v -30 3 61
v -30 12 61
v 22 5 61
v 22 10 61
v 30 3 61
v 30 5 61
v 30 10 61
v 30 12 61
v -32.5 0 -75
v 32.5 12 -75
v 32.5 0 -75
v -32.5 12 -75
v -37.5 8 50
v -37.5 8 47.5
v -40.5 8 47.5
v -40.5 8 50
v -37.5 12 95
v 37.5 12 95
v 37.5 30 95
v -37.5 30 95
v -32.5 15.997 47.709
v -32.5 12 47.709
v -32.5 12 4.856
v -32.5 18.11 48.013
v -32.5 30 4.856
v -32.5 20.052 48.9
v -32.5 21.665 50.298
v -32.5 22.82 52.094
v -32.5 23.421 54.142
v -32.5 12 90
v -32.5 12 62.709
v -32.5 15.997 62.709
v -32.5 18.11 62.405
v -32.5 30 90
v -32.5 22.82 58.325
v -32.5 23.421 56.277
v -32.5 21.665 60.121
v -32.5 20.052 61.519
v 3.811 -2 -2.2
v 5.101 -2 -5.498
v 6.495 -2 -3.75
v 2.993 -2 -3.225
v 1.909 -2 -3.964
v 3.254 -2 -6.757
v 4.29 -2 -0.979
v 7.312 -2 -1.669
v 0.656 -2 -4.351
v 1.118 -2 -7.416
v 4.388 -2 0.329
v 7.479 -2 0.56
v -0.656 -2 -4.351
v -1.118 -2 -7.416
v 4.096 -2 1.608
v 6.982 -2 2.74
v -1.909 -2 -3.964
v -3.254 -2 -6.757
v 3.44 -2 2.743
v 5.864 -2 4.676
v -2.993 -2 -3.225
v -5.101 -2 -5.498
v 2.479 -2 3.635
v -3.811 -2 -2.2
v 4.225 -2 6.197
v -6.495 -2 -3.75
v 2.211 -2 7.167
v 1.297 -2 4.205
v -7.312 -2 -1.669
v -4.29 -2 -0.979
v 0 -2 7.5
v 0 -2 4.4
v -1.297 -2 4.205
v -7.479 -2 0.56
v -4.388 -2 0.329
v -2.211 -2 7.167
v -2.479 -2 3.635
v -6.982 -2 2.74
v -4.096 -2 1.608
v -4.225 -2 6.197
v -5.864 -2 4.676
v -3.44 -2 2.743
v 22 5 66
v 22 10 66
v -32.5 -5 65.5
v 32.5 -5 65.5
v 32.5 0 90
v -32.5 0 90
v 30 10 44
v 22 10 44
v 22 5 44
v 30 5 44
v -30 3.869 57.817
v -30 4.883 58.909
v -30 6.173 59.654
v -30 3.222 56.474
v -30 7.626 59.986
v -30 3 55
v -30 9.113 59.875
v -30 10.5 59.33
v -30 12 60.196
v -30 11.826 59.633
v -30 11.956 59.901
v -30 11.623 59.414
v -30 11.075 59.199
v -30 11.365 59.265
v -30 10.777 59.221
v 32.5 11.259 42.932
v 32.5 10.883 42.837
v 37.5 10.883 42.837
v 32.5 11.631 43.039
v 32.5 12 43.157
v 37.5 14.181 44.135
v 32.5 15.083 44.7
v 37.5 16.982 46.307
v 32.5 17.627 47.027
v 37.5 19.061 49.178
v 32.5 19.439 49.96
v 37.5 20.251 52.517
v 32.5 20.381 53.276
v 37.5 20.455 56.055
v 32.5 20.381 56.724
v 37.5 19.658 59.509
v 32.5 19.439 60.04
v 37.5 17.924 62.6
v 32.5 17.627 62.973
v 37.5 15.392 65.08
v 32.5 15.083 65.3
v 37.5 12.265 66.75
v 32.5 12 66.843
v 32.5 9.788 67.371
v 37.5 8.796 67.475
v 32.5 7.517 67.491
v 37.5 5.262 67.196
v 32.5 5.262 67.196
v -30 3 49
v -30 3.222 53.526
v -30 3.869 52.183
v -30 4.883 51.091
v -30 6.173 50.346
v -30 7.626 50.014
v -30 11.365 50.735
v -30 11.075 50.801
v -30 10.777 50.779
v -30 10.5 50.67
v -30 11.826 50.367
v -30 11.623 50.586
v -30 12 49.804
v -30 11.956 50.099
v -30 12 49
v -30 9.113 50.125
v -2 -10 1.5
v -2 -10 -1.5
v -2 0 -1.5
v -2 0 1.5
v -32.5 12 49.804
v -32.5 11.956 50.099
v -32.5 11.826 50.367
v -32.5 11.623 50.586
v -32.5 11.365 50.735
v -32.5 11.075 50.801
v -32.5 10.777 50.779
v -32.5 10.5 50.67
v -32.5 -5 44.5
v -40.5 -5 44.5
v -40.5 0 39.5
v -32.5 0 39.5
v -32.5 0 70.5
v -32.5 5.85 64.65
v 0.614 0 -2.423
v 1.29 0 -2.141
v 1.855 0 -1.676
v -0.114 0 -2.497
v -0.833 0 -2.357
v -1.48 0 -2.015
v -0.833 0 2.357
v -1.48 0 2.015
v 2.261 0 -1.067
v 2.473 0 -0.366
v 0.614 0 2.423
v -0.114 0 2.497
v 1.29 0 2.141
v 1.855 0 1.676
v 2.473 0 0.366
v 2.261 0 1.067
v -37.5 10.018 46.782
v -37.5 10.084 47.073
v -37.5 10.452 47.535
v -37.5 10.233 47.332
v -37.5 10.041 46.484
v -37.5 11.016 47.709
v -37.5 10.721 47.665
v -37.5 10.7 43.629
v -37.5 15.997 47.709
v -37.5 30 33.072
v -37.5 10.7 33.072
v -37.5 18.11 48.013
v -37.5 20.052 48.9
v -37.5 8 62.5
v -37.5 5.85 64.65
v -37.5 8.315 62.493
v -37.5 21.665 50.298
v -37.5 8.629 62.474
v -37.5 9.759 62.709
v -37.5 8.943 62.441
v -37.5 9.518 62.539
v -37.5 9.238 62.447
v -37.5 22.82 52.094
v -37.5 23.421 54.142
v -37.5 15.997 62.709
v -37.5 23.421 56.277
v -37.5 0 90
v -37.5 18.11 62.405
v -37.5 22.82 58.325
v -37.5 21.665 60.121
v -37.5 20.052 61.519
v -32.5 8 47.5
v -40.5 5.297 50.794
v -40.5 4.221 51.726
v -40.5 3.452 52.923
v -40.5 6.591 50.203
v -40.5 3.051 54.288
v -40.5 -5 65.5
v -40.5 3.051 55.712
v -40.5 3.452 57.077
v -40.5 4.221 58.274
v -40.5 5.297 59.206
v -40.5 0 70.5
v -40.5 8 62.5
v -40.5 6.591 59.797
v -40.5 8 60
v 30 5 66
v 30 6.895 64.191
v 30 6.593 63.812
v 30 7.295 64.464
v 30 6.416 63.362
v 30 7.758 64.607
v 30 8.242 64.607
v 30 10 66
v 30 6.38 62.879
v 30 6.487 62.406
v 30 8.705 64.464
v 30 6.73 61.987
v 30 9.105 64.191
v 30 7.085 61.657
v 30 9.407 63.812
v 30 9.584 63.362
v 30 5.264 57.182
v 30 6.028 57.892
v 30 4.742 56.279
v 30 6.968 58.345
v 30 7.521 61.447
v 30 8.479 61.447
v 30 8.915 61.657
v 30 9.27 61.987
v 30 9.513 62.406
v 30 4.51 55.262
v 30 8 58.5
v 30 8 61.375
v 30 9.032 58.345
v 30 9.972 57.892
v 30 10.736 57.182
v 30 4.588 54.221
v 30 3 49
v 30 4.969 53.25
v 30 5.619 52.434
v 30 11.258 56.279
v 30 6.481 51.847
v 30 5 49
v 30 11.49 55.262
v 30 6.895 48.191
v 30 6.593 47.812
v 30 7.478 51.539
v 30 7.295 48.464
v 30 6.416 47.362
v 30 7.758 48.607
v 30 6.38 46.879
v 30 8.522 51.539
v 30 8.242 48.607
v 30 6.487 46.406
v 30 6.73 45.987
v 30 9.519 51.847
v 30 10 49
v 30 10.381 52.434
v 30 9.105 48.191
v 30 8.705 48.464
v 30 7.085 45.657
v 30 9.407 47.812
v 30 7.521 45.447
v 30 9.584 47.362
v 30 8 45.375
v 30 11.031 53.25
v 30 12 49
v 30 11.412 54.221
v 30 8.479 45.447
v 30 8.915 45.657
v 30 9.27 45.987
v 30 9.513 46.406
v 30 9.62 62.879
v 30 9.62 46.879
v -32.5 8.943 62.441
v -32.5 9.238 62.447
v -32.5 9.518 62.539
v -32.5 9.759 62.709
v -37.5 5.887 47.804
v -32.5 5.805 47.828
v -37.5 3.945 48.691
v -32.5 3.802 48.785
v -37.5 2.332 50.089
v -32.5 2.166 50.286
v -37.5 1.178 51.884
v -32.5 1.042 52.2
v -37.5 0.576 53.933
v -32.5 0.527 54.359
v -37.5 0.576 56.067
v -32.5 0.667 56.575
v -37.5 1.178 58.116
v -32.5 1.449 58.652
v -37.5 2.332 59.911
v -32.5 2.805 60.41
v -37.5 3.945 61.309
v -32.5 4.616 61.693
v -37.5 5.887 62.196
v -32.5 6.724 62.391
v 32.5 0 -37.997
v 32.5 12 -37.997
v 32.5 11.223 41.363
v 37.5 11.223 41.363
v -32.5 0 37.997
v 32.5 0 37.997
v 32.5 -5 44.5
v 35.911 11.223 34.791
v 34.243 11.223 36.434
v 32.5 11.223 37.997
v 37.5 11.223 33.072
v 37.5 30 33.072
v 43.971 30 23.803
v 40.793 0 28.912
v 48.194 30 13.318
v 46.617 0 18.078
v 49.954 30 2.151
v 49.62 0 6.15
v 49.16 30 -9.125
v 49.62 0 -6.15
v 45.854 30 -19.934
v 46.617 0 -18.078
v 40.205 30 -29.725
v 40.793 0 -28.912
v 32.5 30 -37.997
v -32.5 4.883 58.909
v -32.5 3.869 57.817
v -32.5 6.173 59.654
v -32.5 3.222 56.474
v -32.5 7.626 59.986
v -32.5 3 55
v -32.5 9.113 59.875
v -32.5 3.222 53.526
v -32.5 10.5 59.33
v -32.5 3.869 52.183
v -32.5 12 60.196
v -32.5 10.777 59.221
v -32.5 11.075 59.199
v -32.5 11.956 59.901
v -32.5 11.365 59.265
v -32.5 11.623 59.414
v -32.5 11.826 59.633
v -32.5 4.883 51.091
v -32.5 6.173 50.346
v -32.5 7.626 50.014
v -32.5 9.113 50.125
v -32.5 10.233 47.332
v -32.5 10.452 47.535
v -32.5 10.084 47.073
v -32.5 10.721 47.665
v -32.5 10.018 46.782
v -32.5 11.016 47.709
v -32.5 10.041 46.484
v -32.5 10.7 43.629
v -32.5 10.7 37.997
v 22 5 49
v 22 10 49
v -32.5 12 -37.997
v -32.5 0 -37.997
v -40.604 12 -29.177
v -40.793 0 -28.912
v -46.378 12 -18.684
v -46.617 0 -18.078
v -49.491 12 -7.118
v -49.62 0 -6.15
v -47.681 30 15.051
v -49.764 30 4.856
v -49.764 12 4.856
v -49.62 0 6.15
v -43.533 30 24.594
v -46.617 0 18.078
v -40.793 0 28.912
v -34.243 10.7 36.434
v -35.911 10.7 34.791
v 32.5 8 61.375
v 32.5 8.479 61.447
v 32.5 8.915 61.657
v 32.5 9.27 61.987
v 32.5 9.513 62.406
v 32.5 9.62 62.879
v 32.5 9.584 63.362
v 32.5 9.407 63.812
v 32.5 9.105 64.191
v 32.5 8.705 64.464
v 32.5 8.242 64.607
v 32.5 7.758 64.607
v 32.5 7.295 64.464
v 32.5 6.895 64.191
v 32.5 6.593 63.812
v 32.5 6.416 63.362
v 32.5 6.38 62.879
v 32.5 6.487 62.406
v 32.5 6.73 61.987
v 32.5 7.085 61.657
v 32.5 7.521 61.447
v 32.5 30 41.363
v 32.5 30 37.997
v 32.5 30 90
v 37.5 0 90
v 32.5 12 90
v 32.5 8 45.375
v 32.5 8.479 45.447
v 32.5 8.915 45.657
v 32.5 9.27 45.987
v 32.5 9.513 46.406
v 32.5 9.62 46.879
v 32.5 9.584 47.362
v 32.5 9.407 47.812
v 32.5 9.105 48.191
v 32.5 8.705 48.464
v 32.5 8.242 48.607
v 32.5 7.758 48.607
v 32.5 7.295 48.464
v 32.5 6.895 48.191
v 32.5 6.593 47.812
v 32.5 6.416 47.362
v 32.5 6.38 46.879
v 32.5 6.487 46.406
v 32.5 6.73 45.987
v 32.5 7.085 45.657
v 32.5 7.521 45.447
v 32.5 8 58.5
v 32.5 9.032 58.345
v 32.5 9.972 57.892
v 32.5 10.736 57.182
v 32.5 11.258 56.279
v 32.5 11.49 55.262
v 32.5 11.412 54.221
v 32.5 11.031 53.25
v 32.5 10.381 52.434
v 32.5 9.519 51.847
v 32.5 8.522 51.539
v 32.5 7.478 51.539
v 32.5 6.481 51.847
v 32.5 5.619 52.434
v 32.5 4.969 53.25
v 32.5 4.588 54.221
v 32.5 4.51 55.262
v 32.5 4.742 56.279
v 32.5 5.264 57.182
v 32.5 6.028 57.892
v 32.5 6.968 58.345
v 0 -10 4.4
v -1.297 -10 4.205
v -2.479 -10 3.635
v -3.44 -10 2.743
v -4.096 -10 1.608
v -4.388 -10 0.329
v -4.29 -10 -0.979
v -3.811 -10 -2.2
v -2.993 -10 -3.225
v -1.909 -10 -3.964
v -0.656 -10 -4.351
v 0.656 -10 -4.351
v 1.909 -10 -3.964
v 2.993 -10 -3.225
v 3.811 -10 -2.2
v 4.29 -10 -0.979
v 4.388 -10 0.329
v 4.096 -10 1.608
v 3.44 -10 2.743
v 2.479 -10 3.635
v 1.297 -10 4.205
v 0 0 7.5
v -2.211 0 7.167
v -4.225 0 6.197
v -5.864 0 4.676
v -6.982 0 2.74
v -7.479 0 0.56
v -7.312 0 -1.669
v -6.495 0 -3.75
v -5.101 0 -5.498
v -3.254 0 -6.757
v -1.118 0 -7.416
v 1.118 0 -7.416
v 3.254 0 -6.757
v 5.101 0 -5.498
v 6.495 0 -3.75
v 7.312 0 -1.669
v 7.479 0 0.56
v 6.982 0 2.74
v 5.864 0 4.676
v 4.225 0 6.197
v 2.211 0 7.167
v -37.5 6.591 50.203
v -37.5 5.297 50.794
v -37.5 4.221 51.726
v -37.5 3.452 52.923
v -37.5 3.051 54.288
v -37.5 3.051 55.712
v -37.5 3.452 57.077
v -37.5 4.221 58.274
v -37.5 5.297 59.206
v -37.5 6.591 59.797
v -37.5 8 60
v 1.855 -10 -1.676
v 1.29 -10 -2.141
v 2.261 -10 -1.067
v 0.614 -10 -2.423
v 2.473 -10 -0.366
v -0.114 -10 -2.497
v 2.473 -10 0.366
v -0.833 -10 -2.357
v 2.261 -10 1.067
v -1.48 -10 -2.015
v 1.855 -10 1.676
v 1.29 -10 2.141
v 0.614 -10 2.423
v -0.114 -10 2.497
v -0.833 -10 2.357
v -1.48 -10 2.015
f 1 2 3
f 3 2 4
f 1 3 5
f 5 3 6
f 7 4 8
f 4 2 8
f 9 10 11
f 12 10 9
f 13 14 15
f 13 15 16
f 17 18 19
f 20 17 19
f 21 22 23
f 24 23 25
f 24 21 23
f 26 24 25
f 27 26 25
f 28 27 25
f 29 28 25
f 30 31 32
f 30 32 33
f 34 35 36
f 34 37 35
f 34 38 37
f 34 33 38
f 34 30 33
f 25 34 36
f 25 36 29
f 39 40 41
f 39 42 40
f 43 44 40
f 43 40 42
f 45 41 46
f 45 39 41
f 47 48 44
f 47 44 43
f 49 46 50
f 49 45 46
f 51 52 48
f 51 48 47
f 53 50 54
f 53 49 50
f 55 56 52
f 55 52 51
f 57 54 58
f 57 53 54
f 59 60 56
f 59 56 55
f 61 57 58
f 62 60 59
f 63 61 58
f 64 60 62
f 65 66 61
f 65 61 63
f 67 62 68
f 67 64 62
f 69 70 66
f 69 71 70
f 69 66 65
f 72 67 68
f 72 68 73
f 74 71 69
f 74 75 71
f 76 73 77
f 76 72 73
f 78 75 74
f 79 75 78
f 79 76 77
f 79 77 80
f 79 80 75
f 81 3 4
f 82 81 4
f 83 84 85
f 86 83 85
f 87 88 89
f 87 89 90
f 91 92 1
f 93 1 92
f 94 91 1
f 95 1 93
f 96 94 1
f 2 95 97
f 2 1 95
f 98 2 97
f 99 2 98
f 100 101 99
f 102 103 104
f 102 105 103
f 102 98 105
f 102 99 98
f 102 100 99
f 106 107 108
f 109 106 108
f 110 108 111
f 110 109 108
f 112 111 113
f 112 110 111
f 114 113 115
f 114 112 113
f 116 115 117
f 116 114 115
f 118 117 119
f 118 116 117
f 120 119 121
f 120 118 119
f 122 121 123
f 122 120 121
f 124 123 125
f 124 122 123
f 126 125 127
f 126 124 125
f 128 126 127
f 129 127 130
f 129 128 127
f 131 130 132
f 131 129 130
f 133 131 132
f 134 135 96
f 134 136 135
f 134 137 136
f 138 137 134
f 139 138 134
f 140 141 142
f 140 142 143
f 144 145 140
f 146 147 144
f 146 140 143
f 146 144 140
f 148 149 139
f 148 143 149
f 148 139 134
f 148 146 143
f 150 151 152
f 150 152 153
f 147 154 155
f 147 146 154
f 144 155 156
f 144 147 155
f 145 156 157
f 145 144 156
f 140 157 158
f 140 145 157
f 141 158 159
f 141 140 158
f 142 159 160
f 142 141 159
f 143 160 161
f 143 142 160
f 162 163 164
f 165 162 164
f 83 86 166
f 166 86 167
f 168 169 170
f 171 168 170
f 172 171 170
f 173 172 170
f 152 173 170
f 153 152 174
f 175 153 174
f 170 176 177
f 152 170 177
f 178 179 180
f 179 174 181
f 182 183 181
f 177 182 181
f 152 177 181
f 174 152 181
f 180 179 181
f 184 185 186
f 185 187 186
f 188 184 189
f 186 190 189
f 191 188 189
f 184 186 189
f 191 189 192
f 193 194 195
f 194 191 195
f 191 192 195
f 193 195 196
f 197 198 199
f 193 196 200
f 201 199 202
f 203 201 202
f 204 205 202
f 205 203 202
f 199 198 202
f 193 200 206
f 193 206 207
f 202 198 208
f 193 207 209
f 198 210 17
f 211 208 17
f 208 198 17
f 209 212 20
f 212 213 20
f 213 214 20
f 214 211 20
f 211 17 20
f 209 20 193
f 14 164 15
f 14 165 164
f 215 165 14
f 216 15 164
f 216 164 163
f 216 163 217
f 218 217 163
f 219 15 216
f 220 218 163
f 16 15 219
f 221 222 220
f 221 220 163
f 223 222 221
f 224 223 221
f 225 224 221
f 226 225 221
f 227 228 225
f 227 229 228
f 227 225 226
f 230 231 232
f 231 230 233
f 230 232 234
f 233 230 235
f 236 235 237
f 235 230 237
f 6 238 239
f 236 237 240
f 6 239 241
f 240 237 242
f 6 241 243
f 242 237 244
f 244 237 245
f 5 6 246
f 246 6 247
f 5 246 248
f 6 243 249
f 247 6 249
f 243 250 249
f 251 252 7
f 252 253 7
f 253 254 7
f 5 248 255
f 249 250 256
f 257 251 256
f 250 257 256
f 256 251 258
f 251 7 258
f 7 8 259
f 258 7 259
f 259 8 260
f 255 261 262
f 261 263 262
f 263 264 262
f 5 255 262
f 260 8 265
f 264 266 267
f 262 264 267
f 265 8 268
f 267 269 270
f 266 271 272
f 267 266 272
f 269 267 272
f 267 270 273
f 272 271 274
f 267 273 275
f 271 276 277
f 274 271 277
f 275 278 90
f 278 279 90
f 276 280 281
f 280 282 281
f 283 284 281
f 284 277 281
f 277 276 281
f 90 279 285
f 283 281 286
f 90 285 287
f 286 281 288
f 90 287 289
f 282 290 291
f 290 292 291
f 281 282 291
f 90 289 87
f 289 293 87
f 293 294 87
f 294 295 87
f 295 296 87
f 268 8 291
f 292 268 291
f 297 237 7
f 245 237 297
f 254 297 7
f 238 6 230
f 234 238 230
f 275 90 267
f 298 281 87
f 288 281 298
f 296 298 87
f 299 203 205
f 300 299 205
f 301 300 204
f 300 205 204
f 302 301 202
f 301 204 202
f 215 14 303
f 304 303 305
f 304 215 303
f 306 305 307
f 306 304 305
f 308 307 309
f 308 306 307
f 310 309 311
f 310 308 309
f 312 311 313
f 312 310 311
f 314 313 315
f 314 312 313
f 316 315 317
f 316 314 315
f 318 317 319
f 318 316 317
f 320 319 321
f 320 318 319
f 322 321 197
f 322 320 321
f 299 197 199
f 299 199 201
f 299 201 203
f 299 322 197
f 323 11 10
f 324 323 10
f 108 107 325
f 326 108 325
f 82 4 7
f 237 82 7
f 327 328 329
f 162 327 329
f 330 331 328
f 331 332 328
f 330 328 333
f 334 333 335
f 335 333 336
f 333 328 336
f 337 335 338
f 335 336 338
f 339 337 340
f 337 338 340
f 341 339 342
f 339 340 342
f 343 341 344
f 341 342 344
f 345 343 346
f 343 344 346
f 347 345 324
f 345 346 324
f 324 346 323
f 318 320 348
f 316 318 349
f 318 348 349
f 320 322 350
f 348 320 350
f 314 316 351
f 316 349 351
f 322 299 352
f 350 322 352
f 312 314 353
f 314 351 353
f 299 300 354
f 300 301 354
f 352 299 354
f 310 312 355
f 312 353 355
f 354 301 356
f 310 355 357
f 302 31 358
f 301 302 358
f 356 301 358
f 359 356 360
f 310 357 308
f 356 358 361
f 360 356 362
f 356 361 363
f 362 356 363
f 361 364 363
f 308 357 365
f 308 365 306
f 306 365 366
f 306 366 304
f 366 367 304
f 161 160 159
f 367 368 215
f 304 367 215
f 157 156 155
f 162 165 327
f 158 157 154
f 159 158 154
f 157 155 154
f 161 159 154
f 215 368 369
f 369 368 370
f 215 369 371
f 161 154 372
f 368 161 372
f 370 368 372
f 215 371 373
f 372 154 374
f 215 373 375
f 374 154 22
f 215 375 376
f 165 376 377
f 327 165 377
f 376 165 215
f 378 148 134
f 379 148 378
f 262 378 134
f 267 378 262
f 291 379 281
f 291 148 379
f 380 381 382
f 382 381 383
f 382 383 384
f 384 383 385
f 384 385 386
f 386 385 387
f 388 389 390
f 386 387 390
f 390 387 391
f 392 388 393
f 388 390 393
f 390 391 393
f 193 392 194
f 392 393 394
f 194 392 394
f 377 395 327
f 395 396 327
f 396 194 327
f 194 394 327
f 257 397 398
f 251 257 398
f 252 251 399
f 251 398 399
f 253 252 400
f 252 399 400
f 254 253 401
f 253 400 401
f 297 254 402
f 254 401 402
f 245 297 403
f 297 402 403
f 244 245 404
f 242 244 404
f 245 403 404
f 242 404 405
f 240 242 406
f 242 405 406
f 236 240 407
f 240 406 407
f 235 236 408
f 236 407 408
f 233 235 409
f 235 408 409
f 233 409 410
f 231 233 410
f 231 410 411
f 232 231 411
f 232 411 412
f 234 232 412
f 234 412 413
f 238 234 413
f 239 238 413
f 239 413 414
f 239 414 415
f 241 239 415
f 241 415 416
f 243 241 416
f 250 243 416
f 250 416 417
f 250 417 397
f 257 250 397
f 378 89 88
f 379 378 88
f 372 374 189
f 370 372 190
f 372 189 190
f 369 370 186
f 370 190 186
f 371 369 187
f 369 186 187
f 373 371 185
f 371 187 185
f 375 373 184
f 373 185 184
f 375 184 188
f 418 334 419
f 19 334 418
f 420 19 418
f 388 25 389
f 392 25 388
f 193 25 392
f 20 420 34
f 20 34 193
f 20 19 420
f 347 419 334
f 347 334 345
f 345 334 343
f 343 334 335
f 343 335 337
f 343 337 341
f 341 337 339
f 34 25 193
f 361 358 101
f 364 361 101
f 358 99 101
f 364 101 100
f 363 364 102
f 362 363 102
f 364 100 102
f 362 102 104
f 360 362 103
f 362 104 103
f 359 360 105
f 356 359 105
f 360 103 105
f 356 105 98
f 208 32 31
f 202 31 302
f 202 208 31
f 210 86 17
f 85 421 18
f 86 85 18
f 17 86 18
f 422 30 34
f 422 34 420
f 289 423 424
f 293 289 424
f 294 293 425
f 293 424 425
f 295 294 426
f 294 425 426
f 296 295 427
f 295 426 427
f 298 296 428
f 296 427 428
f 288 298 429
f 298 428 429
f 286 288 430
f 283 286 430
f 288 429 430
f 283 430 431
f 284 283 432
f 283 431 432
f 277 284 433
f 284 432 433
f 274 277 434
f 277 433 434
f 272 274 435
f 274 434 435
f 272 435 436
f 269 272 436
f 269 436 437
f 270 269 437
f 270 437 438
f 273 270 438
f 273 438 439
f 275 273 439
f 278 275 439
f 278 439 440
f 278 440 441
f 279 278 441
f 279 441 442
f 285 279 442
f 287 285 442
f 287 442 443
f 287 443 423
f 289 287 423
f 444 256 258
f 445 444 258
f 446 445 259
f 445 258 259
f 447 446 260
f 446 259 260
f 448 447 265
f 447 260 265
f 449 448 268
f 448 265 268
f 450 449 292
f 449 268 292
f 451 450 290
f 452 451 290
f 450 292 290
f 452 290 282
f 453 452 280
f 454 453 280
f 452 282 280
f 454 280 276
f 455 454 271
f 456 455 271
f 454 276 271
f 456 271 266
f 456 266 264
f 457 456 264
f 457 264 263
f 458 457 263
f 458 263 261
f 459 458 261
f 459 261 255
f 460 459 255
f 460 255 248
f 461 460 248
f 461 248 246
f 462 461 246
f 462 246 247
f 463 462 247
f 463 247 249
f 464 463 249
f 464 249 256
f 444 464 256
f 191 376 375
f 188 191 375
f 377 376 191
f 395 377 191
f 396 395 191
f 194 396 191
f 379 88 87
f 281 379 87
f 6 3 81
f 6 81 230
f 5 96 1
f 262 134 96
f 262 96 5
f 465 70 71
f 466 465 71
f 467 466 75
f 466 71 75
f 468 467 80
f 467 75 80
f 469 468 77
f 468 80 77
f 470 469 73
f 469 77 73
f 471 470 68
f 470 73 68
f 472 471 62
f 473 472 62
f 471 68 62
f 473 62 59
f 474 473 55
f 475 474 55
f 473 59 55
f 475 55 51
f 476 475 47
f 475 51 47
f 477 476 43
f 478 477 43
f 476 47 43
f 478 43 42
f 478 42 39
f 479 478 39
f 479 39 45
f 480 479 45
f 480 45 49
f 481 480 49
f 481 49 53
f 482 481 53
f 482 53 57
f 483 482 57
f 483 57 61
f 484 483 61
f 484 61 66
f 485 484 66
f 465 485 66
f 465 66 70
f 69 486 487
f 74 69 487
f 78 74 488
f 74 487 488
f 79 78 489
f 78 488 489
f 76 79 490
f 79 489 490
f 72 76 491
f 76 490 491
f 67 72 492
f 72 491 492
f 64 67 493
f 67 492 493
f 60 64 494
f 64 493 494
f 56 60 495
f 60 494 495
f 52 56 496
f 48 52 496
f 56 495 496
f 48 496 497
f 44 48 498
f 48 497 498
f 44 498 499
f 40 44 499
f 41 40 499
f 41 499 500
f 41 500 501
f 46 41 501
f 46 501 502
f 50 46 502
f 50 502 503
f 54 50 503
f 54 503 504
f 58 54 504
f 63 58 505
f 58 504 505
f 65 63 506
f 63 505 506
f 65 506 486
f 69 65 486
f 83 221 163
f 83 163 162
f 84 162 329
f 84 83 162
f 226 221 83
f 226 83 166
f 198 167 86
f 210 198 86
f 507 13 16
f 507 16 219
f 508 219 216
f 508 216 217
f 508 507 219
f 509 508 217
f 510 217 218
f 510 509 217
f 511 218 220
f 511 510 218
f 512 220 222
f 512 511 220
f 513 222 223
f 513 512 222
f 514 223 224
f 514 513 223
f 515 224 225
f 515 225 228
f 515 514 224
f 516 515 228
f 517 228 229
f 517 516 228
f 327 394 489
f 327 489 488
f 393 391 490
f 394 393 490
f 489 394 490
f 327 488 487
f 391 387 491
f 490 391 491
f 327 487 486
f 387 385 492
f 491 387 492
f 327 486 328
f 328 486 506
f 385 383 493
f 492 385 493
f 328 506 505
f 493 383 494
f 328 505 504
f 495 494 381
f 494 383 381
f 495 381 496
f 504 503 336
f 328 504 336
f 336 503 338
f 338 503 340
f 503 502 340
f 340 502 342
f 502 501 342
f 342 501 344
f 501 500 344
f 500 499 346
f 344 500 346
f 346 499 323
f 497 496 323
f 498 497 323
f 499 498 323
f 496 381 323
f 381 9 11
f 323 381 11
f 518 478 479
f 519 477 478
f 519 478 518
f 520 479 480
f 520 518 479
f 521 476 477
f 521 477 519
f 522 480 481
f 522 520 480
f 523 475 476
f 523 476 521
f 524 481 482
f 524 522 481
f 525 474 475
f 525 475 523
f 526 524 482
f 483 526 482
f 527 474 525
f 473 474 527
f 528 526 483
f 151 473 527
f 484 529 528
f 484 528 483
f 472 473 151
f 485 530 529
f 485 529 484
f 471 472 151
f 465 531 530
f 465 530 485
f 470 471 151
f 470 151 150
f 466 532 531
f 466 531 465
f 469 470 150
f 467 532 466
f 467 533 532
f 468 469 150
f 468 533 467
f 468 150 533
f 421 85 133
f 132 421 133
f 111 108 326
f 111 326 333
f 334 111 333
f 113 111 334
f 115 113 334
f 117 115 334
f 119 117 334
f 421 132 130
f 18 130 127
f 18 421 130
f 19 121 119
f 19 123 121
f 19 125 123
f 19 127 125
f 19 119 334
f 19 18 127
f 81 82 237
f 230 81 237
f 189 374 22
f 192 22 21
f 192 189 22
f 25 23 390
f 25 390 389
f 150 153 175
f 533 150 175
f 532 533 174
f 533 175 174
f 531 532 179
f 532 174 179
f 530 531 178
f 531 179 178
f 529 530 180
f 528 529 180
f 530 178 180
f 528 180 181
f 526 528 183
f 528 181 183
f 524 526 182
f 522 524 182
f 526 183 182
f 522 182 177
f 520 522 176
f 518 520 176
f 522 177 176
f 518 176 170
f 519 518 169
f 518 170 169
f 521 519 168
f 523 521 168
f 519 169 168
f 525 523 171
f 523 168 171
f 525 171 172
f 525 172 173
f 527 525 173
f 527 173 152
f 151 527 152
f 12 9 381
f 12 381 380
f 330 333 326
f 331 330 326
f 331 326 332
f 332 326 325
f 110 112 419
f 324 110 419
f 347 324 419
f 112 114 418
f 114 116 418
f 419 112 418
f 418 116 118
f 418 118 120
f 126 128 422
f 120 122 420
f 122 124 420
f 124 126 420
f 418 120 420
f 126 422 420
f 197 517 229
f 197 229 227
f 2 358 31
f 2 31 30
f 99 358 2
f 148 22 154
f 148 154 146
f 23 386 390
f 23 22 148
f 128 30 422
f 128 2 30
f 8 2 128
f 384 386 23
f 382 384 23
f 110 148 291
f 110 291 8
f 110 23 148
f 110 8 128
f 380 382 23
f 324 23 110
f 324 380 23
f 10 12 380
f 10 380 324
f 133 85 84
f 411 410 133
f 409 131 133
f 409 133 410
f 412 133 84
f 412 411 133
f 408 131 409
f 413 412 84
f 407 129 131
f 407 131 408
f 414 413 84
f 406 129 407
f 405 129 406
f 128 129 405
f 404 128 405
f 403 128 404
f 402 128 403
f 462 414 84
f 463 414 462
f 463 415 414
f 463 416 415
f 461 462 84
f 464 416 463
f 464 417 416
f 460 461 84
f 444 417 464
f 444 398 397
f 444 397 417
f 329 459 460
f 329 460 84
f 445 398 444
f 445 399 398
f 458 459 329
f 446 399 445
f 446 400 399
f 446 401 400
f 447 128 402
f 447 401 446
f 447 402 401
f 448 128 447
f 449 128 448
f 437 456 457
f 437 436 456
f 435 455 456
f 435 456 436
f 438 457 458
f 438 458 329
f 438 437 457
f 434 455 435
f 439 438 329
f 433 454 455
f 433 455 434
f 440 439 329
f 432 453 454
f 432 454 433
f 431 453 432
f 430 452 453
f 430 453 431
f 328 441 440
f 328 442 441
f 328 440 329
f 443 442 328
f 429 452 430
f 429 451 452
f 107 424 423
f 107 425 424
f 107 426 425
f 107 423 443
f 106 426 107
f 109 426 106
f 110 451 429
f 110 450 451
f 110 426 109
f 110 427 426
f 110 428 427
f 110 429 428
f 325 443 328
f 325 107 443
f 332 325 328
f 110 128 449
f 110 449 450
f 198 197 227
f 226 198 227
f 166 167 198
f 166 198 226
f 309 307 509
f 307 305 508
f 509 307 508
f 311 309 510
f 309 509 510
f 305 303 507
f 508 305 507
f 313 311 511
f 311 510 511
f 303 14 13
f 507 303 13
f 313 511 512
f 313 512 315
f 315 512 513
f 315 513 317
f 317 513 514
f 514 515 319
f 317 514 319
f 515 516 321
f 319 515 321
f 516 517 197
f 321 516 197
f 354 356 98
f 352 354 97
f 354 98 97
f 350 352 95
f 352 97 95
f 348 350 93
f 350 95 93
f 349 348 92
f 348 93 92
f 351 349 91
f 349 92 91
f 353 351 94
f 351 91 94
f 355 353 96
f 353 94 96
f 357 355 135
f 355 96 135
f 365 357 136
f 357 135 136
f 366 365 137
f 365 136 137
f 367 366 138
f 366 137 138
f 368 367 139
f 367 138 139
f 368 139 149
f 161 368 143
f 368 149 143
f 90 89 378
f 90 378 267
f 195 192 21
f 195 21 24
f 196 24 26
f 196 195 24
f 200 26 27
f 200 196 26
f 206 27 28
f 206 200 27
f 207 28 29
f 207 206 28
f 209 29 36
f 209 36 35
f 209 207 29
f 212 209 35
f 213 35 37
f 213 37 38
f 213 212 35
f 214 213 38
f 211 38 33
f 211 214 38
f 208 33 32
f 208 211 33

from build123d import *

# Parameters (mm, degrees)
SKETCH1_R                 = 50
BOSS_EXTRUDE1_DEPTH       = 30
SKETCH2_R                 = 4.4
BOSS_EXTRUDE2_DEPTH       = 10
SKETCH3_R                 = 7.5
SKETCH3_R_2               = 4.4
BOSS_EXTRUDE3_DEPTH       = 2
SKETCH4_W                 = 65
SKETCH4_H                 = 100
CUT_EXTRUDE1_DEPTH        = 18
SKETCH5_W                 = 65
SKETCH5_H                 = 12
BOSS_EXTRUDE4_DEPTH       = 40
BOSS_EXTRUDE5_REACH       = 117.758
BOSS_EXTRUDE5_END_RADIUS  = 50
SKETCH6_W                 = 65
SKETCH6_H                 = 12
SKETCH7_W                 = 60
SKETCH7_H                 = 12
CUT_EXTRUDE2_DEPTH        = 9
SKETCH9_R                 = 3.5
CUT_EXTRUDE4_DEPTH        = 2.5
BOSS_EXTRUDE6_DEPTH       = 4
BOSS_EXTRUDE7_DEPTH       = 4
SKETCH15_R                = 5
CUT_EXTRUDE7_DEPTH        = 2.5
SKETCH11_R                = 1.625
CUT_EXTRUDE8_DEPTH        = 5
CUT_EXTRUDE9_DEPTH        = 17
CUT_EXTRUDE9_DEPTH_BACK   = 5
SKETCH16_W                = 8
SKETCH16_H                = 5
SKETCH17_W                = 73
SKETCH17_H                = 21
BOSS_EXTRUDE8_DEPTH       = 5
BOSS_EXTRUDE9_DEPTH       = 65
BOSS_EXTRUDE10_DEPTH      = 8
FILLET2_R                 = 1
SKETCH20_W                = 65
SKETCH20_H                = 5
BOSS_EXTRUDE11_DEPTH      = 18
BOSS_EXTRUDE12_DEPTH      = 65
SKETCH23_W                = 65
SKETCH23_H                = 12
BOSS_EXTRUDE13_DEPTH      = 25
BOSS_EXTRUDE14_REACH      = 158.285
BOSS_EXTRUDE14_END_RADIUS = 50
SKETCH24_W                = 65
SKETCH24_H                = 12
BOSS_EXTRUDE19_DEPTH      = 5
BOSS_EXTRUDE20_REACH      = 132.155
BOSS_EXTRUDE20_END_RADIUS = 50
SKETCH26_W                = 5
SKETCH26_H                = 18.776858115
SKETCH27_R                = 12.5
CUT_EXTRUDE10_DEPTH       = 5
BOSS_EXTRUDE23_DEPTH      = 5
BOSS_EXTRUDE24_REACH      = 134.185
BOSS_EXTRUDE24_END_RADIUS = 50
SKETCH29_W                = 5
SKETCH29_H                = 19.299681274
SKETCH30_R                = 7.5
CUT_EXTRUDE11_DEPTH       = 5
CUT_EXTRUDE14_DEPTH       = 5
FILLET4_R                 = 1
SKETCH35_W                = 42.8529271
SKETCH35_H                = 18
CUT_EXTRUDE15_DEPTH       = 130.349333203


with BuildPart() as part:
    # Sketch1 → Boss-Extrude1 (new body)
    with BuildSketch(Plane(origin=(0, 0, 0), x_dir=(1, 0, 0), z_dir=(0, 1, 0))):
        with Locations(Location((0, 0, 0), (0, 0, 270))):
            Circle(SKETCH1_R)
    extrude(amount=BOSS_EXTRUDE1_DEPTH)

    # Sketch2 → Boss-Extrude2 (add)
    with BuildSketch(Plane.XZ):
        with Locations(Location((0, 0, 0), (0, 0, 90))):
            Circle(SKETCH2_R)
        with BuildLine():
            Line((-2, -1.5), (-2, 1.5))
            ThreePointArc((-2, 1.5), (2.5, 0), (-2, -1.5))
        make_face(mode=Mode.SUBTRACT)
    extrude(amount=BOSS_EXTRUDE2_DEPTH)

    # Sketch3 → Boss-Extrude3 (add)
    with BuildSketch(Plane.XZ):
        with Locations(Location((0, 0, 0), (0, 0, 90))):
            Circle(SKETCH3_R)
        with Locations(Location((0, 0, 0), (0, 0, 270))):
            Circle(SKETCH3_R_2, mode=Mode.SUBTRACT)
    extrude(amount=BOSS_EXTRUDE3_DEPTH)

    # Sketch4 → Cut-Extrude1 (cut)
    with BuildSketch(Plane(origin=(0, 30, 0), x_dir=(1, 0, 0), z_dir=(0, 1, 0))):
        Rectangle(SKETCH4_W, SKETCH4_H)
    extrude(amount=-CUT_EXTRUDE1_DEPTH, mode=Mode.SUBTRACT)



with BuildPart() as body_2:
    # Sketch5 → Boss-Extrude4 (new body)
    with BuildSketch(Plane(origin=(0, 12, 50), x_dir=(1, 0, 0), z_dir=(0, 0, 1))):
        with Locations((0, -6)):
            Rectangle(SKETCH5_W, SKETCH5_H)
    extrude(amount=BOSS_EXTRUDE4_DEPTH)


with BuildPart() as part_1:
    add(part.part)

    add(body_2.part)  # Boss-Extrude5 merges body 2
    # Boss-Extrude5: up to this cylinder (the profile starts outside it)
    boss_extrude5_end = Plane(origin=(0, 6, 0), z_dir=(0, -1, 0)) * Cylinder(BOSS_EXTRUDE5_END_RADIUS, 336.516, mode=Mode.PRIVATE)
    # Sketch6 → Boss-Extrude5 (add, up to the surface)
    with BuildSketch(Plane(origin=(0, 0, 50), x_dir=(-1, 0, 0), z_dir=(0, 0, -1)), mode=Mode.PRIVATE) as boss_extrude5_sk1:
        with Locations((0, 6)):
            Rectangle(SKETCH6_W, SKETCH6_H)
    boss_extrude5_tool1 = extrude(boss_extrude5_sk1.sketch, amount=BOSS_EXTRUDE5_REACH, mode=Mode.PRIVATE) - boss_extrude5_end
    add(boss_extrude5_tool1.solids().sort_by_distance((0, 6, 50))[0])
    add(boss_extrude5_tool1.solids().sort_by_distance((0, 6, 50))[1])

    # Sketch7 → Cut-Extrude2 (cut)
    with BuildSketch(Plane(origin=(0, 12, 0), x_dir=(1, 0, 0), z_dir=(0, 1, 0))):
        with Locations((0, -55)):
            Rectangle(SKETCH7_W, SKETCH7_H)
    extrude(amount=-CUT_EXTRUDE2_DEPTH, mode=Mode.SUBTRACT)

    # Sketch9 → Cut-Extrude4 (cut)
    with BuildSketch(Plane.ZY.offset(-30)):
        with Locations((55, 8)):
            Circle(SKETCH9_R)
    extrude(amount=-CUT_EXTRUDE4_DEPTH, mode=Mode.SUBTRACT)

    # Sketch13 → Boss-Extrude6 (add)
    with BuildSketch(Plane.ZY.offset(32.5)):
        with BuildLine():
            Line((39.5, 0), (47.5, 0))
            Line((47.5, 0), (62.5, 0))
            Line((62.5, 0), (70.5, 0))
            Line((70.5, 0), (62.5, 8))
            ThreePointArc((62.5, 8), (55, 0.5), (47.5, 8))
            Line((47.5, 8), (39.5, 0))
        make_face()
    extrude(amount=BOSS_EXTRUDE6_DEPTH)

    # Sketch14 → Boss-Extrude7 (add)
    with BuildSketch(Plane.ZY.offset(36.5)):
        with BuildLine():
            Line((39.5, 0), (47.5, 8))
            Line((47.5, 8), (50, 8))
            ThreePointArc((50, 8), (55, 3), (60, 8))
            Line((60, 8), (62.5, 8))
            Line((62.5, 8), (70.5, 0))
            Line((70.5, 0), (39.5, 0))
        make_face()
    extrude(amount=BOSS_EXTRUDE7_DEPTH)

    # Sketch15 → Cut-Extrude7 (cut)
    with BuildSketch(Plane(origin=(-30, 0, 0), x_dir=(0, 0, -1), z_dir=(1, 0, 0))):
        with Locations((-55, 8)):
            Circle(SKETCH15_R)
    extrude(amount=-CUT_EXTRUDE7_DEPTH, mode=Mode.SUBTRACT)

    # Sketch11 → Cut-Extrude8 (cut)
    with BuildSketch(Plane(origin=(32.5, 0, 0), x_dir=(0, 0, -1), z_dir=(1, 0, 0))):
        with Locations((-63, 8)):
            Circle(SKETCH11_R)
        with Locations((-47, 8)):
            Circle(SKETCH11_R)
    extrude(amount=-CUT_EXTRUDE8_DEPTH, mode=Mode.SUBTRACT)

    # Sketch16 → Cut-Extrude9 (cut, two sides: drawn at the far end of the back side and taken through both)
    with BuildSketch(Plane.XY.offset(49).offset(-CUT_EXTRUDE9_DEPTH_BACK)):
        with Locations((26, 7.5)):
            Rectangle(SKETCH16_W, SKETCH16_H)
    extrude(amount=CUT_EXTRUDE9_DEPTH + CUT_EXTRUDE9_DEPTH_BACK, mode=Mode.SUBTRACT)

    # Sketch17 → Boss-Extrude8 (add)
    with BuildSketch(Plane.XZ):
        with Locations((-4, 55)):
            Rectangle(SKETCH17_W, SKETCH17_H)
    extrude(amount=BOSS_EXTRUDE8_DEPTH)

    # Sketch18 → Boss-Extrude9 (add)
    with BuildSketch(Plane(origin=(32.5, 0, 0), x_dir=(0, 0, -1), z_dir=(1, 0, 0))):
        Polygon((-65.5, -5), (-90, 0), (-65.5, 0), align=None)
        Polygon((-44.5, -5), (-44.5, 0), (-37.996710384, 0), align=None)
    extrude(amount=-BOSS_EXTRUDE9_DEPTH)

    # Sketch19 → Boss-Extrude10 (add)
    with BuildSketch(Plane.ZY.offset(40.5)):
        Polygon((65.5, -5), (70.5, 0), (65.5, 0), align=None)
        Polygon((44.5, -5), (39.5, 0), (44.5, 0), align=None)
    extrude(amount=-BOSS_EXTRUDE10_DEPTH)

    # Fillet2
    fillet2_edges = [part_1.edges().sort_by_distance(p)[0] for p in [
        (-31.25, 12, 58),
        (-31.25, 12, 52),
    ]]
    fillet(fillet2_edges, radius=FILLET2_R)



with BuildPart() as body_2_2:
    # Sketch20 → Boss-Extrude11 (new body)
    with BuildSketch(Plane(origin=(0, 12, 0), x_dir=(1, 0, 0), z_dir=(0, 1, 0))):
        with Locations((0, -92.5)):
            Rectangle(SKETCH20_W, SKETCH20_H)
    extrude(amount=BOSS_EXTRUDE11_DEPTH)


with BuildPart() as part_2:
    add(part_1.part)

    add(body_2_2.part)  # Boss-Extrude12 merges body 2 2
    # Sketch22 → Boss-Extrude12 (add)
    with BuildSketch(Plane(origin=(32.5, 0, 0), x_dir=(0, 0, -1), z_dir=(1, 0, 0))):
        Polygon((-95, 12), (-90, 0), (-90, 12), align=None)
    extrude(amount=-BOSS_EXTRUDE12_DEPTH)



with BuildPart() as body_2_3:
    # Sketch23 → Boss-Extrude13 (new body)
    with BuildSketch(Plane(origin=(0, 12, -50), x_dir=(-1, 0, 0), z_dir=(0, 0, -1))):
        with Locations((0, -6)):
            Rectangle(SKETCH23_W, SKETCH23_H)
    extrude(amount=BOSS_EXTRUDE13_DEPTH)


with BuildPart() as part_3:
    add(part_2.part)

    add(body_2_3.part)  # Boss-Extrude14 merges body 2 3
    # Boss-Extrude14: up to this cylinder (the profile starts outside it)
    boss_extrude14_end = Plane(origin=(0, 6, 0), z_dir=(0, -1, 0)) * Cylinder(BOSS_EXTRUDE14_END_RADIUS, 417.57, mode=Mode.PRIVATE)
    # Sketch24 → Boss-Extrude14 (add, up to the surface)
    with BuildSketch(Plane.XY.offset(-50), mode=Mode.PRIVATE) as boss_extrude14_sk1:
        with Locations((0, 6)):
            Rectangle(SKETCH24_W, SKETCH24_H)
    boss_extrude14_tool1 = extrude(boss_extrude14_sk1.sketch, amount=BOSS_EXTRUDE14_REACH, mode=Mode.PRIVATE) - boss_extrude14_end
    add(boss_extrude14_tool1.solids().sort_by_distance((0, 6, -50))[0])
    add(boss_extrude14_tool1.solids().sort_by_distance((0, 6, -50))[1])

    # Sketch25 → Boss-Extrude19 (add)
    with BuildSketch(Plane(origin=(32.5, 0, 0), x_dir=(0, 0, -1), z_dir=(1, 0, 0))):
        Polygon((-95, 30), (-95, 12), (-90, 0), (-41.363308514, 11.223141885), (-41.363308514, 30), align=None)
    extrude(amount=BOSS_EXTRUDE19_DEPTH)

    # Boss-Extrude20: up to this cylinder (the profile starts outside it)
    boss_extrude20_end = Plane(origin=(0, 20.611571, 0), z_dir=(0, -1, 0)) * Cylinder(BOSS_EXTRUDE20_END_RADIUS, 365.31, mode=Mode.PRIVATE)
    # Sketch26 → Boss-Extrude20 (add, up to the surface)
    with BuildSketch(Plane(origin=(0, 0, 41.363308514), x_dir=(-1, 0, 0), z_dir=(0, 0, -1)), mode=Mode.PRIVATE) as boss_extrude20_sk1:
        with Locations((-35, 20.611570943)):
            Rectangle(SKETCH26_W, SKETCH26_H)
    boss_extrude20_tool1 = extrude(boss_extrude20_sk1.sketch, amount=BOSS_EXTRUDE20_REACH, mode=Mode.PRIVATE) - boss_extrude20_end
    add(boss_extrude20_tool1.solids().sort_by_distance((35, 20.611571, 41.363309))[0])

    # Sketch27 → Cut-Extrude10 (cut)
    with BuildSketch(Plane(origin=(32.5, 0, 0), x_dir=(0, 0, -1), z_dir=(1, 0, 0))):
        with Locations((-55, 8)):
            Circle(SKETCH27_R)
    extrude(amount=CUT_EXTRUDE10_DEPTH, mode=Mode.SUBTRACT)

    # Sketch28 → Boss-Extrude23 (add)
    with BuildSketch(Plane.ZY.offset(32.5)):
        Polygon((95, 30), (43.629018859, 30), (43.629018859, 10.700318726), (90, 0), (95, 12), align=None)
    extrude(amount=BOSS_EXTRUDE23_DEPTH)

    # Boss-Extrude24: up to this cylinder (the profile starts outside it)
    boss_extrude24_end = Plane(origin=(0, 20.350159, 0), z_dir=(0, -1, 0)) * Cylinder(BOSS_EXTRUDE24_END_RADIUS, 369.37, mode=Mode.PRIVATE)
    # Sketch29 → Boss-Extrude24 (add, up to the surface)
    with BuildSketch(Plane(origin=(0, 0, 43.629018859), x_dir=(-1, 0, 0), z_dir=(0, 0, -1)), mode=Mode.PRIVATE) as boss_extrude24_sk1:
        with Locations((35, 20.350159363)):
            Rectangle(SKETCH29_W, SKETCH29_H)
    boss_extrude24_tool1 = extrude(boss_extrude24_sk1.sketch, amount=BOSS_EXTRUDE24_REACH, mode=Mode.PRIVATE) - boss_extrude24_end
    add(boss_extrude24_tool1.solids().sort_by_distance((-35, 20.350159, 43.629019))[0])

    # Sketch30 → Cut-Extrude11 (cut)
    with BuildSketch(Plane.ZY.offset(32.5)):
        with Locations((55, 8)):
            Circle(SKETCH30_R)
    extrude(amount=CUT_EXTRUDE11_DEPTH, mode=Mode.SUBTRACT)

    # Sketch32 → Cut-Extrude14 (cut)
    with BuildSketch(Plane.ZY.offset(37.5)):
        with BuildLine():
            Line((47.709143816, 9.75881099), (47.709143816, 15.997265712))
            ThreePointArc((47.709143816, 15.997265712), (55.209143816, 23.497265712), (62.709143816, 15.997265712))
            Line((62.709143816, 15.997265712), (62.709143816, 9.75881099))
            Line((62.709143816, 9.75881099), (47.709143816, 9.75881099))
        make_face()
    extrude(amount=-CUT_EXTRUDE14_DEPTH, mode=Mode.SUBTRACT)

    # Fillet4
    # the kernel refuses this fillet: 1 mm, written as the material it takes off along each edge
    with BuildSketch(Plane(origin=(-39.574233457, 9.75881099, 62.290856184), x_dir=(0, 0, 1), z_dir=(1, 0, 0))) as fillet4_piece_1:
        with BuildLine():
            CenterArc((1.141727679, 0.690387208), FILLET4_R, 172.778996455, 50.881771072)
            Line((0.14965899, 0.816084123), (0.129817616, 0.818598062))
            ThreePointArc((0.129817616, 0.818598062), (0.066451188, 0.409578532), (-0.019442283, 0.004690163))
            Line((-0.019442283, 0.004690163), (0, -0.02))
            ThreePointArc((0, -0.02), (0.209143816, -0.02), (0.40381883, -0.013807744))
            Line((0.40381883, -0.013807744), (0.418287631, 0))
        make_face()
    extrude(amount=7.074233457, mode=Mode.SUBTRACT)
    with BuildSketch(Plane(origin=(-40.642583004, 9.75881099, 47.709143816), x_dir=(0, 0.22484600170345923, -0.9743943121334238), z_dir=(1, 0, 0))) as fillet4_piece_2:
        with BuildLine():
            CenterArc((FILLET4_R * 1.2570332015, FILLET4_R), FILLET4_R, 167.006177322, 102.993822678)
            Line((FILLET4_R * 0.282638889366, FILLET4_R * 1.2248460017), (FILLET4_R * 0.263151003123, FILLET4_R * 1.22934292174))
            Line((FILLET4_R * 0.263151003123, FILLET4_R * 1.22934292174), (-FILLET4_R * 0.02514066403, -FILLET4_R * 0.02))
            Line((-FILLET4_R * 0.02514066403, -FILLET4_R * 0.02), (FILLET4_R * 1.2570332015, -FILLET4_R * 0.02))
            Line((FILLET4_R * 1.2570332015, -FILLET4_R * 0.02), (FILLET4_R * 1.2570332015, 0))
        make_face()
    extrude(amount=8.142583004, mode=Mode.SUBTRACT)

    # Sketch35 → Cut-Extrude15 (cut, through all)
    with BuildSketch(Plane(origin=(-32.5, 0, 0), x_dir=(0, 0, -1), z_dir=(1, 0, 0))):
        with Locations((16.570246834, 21)):
            Rectangle(SKETCH35_W, SKETCH35_H)
    extrude(amount=-CUT_EXTRUDE15_DEPTH, mode=Mode.SUBTRACT)


solid = part_3.part
